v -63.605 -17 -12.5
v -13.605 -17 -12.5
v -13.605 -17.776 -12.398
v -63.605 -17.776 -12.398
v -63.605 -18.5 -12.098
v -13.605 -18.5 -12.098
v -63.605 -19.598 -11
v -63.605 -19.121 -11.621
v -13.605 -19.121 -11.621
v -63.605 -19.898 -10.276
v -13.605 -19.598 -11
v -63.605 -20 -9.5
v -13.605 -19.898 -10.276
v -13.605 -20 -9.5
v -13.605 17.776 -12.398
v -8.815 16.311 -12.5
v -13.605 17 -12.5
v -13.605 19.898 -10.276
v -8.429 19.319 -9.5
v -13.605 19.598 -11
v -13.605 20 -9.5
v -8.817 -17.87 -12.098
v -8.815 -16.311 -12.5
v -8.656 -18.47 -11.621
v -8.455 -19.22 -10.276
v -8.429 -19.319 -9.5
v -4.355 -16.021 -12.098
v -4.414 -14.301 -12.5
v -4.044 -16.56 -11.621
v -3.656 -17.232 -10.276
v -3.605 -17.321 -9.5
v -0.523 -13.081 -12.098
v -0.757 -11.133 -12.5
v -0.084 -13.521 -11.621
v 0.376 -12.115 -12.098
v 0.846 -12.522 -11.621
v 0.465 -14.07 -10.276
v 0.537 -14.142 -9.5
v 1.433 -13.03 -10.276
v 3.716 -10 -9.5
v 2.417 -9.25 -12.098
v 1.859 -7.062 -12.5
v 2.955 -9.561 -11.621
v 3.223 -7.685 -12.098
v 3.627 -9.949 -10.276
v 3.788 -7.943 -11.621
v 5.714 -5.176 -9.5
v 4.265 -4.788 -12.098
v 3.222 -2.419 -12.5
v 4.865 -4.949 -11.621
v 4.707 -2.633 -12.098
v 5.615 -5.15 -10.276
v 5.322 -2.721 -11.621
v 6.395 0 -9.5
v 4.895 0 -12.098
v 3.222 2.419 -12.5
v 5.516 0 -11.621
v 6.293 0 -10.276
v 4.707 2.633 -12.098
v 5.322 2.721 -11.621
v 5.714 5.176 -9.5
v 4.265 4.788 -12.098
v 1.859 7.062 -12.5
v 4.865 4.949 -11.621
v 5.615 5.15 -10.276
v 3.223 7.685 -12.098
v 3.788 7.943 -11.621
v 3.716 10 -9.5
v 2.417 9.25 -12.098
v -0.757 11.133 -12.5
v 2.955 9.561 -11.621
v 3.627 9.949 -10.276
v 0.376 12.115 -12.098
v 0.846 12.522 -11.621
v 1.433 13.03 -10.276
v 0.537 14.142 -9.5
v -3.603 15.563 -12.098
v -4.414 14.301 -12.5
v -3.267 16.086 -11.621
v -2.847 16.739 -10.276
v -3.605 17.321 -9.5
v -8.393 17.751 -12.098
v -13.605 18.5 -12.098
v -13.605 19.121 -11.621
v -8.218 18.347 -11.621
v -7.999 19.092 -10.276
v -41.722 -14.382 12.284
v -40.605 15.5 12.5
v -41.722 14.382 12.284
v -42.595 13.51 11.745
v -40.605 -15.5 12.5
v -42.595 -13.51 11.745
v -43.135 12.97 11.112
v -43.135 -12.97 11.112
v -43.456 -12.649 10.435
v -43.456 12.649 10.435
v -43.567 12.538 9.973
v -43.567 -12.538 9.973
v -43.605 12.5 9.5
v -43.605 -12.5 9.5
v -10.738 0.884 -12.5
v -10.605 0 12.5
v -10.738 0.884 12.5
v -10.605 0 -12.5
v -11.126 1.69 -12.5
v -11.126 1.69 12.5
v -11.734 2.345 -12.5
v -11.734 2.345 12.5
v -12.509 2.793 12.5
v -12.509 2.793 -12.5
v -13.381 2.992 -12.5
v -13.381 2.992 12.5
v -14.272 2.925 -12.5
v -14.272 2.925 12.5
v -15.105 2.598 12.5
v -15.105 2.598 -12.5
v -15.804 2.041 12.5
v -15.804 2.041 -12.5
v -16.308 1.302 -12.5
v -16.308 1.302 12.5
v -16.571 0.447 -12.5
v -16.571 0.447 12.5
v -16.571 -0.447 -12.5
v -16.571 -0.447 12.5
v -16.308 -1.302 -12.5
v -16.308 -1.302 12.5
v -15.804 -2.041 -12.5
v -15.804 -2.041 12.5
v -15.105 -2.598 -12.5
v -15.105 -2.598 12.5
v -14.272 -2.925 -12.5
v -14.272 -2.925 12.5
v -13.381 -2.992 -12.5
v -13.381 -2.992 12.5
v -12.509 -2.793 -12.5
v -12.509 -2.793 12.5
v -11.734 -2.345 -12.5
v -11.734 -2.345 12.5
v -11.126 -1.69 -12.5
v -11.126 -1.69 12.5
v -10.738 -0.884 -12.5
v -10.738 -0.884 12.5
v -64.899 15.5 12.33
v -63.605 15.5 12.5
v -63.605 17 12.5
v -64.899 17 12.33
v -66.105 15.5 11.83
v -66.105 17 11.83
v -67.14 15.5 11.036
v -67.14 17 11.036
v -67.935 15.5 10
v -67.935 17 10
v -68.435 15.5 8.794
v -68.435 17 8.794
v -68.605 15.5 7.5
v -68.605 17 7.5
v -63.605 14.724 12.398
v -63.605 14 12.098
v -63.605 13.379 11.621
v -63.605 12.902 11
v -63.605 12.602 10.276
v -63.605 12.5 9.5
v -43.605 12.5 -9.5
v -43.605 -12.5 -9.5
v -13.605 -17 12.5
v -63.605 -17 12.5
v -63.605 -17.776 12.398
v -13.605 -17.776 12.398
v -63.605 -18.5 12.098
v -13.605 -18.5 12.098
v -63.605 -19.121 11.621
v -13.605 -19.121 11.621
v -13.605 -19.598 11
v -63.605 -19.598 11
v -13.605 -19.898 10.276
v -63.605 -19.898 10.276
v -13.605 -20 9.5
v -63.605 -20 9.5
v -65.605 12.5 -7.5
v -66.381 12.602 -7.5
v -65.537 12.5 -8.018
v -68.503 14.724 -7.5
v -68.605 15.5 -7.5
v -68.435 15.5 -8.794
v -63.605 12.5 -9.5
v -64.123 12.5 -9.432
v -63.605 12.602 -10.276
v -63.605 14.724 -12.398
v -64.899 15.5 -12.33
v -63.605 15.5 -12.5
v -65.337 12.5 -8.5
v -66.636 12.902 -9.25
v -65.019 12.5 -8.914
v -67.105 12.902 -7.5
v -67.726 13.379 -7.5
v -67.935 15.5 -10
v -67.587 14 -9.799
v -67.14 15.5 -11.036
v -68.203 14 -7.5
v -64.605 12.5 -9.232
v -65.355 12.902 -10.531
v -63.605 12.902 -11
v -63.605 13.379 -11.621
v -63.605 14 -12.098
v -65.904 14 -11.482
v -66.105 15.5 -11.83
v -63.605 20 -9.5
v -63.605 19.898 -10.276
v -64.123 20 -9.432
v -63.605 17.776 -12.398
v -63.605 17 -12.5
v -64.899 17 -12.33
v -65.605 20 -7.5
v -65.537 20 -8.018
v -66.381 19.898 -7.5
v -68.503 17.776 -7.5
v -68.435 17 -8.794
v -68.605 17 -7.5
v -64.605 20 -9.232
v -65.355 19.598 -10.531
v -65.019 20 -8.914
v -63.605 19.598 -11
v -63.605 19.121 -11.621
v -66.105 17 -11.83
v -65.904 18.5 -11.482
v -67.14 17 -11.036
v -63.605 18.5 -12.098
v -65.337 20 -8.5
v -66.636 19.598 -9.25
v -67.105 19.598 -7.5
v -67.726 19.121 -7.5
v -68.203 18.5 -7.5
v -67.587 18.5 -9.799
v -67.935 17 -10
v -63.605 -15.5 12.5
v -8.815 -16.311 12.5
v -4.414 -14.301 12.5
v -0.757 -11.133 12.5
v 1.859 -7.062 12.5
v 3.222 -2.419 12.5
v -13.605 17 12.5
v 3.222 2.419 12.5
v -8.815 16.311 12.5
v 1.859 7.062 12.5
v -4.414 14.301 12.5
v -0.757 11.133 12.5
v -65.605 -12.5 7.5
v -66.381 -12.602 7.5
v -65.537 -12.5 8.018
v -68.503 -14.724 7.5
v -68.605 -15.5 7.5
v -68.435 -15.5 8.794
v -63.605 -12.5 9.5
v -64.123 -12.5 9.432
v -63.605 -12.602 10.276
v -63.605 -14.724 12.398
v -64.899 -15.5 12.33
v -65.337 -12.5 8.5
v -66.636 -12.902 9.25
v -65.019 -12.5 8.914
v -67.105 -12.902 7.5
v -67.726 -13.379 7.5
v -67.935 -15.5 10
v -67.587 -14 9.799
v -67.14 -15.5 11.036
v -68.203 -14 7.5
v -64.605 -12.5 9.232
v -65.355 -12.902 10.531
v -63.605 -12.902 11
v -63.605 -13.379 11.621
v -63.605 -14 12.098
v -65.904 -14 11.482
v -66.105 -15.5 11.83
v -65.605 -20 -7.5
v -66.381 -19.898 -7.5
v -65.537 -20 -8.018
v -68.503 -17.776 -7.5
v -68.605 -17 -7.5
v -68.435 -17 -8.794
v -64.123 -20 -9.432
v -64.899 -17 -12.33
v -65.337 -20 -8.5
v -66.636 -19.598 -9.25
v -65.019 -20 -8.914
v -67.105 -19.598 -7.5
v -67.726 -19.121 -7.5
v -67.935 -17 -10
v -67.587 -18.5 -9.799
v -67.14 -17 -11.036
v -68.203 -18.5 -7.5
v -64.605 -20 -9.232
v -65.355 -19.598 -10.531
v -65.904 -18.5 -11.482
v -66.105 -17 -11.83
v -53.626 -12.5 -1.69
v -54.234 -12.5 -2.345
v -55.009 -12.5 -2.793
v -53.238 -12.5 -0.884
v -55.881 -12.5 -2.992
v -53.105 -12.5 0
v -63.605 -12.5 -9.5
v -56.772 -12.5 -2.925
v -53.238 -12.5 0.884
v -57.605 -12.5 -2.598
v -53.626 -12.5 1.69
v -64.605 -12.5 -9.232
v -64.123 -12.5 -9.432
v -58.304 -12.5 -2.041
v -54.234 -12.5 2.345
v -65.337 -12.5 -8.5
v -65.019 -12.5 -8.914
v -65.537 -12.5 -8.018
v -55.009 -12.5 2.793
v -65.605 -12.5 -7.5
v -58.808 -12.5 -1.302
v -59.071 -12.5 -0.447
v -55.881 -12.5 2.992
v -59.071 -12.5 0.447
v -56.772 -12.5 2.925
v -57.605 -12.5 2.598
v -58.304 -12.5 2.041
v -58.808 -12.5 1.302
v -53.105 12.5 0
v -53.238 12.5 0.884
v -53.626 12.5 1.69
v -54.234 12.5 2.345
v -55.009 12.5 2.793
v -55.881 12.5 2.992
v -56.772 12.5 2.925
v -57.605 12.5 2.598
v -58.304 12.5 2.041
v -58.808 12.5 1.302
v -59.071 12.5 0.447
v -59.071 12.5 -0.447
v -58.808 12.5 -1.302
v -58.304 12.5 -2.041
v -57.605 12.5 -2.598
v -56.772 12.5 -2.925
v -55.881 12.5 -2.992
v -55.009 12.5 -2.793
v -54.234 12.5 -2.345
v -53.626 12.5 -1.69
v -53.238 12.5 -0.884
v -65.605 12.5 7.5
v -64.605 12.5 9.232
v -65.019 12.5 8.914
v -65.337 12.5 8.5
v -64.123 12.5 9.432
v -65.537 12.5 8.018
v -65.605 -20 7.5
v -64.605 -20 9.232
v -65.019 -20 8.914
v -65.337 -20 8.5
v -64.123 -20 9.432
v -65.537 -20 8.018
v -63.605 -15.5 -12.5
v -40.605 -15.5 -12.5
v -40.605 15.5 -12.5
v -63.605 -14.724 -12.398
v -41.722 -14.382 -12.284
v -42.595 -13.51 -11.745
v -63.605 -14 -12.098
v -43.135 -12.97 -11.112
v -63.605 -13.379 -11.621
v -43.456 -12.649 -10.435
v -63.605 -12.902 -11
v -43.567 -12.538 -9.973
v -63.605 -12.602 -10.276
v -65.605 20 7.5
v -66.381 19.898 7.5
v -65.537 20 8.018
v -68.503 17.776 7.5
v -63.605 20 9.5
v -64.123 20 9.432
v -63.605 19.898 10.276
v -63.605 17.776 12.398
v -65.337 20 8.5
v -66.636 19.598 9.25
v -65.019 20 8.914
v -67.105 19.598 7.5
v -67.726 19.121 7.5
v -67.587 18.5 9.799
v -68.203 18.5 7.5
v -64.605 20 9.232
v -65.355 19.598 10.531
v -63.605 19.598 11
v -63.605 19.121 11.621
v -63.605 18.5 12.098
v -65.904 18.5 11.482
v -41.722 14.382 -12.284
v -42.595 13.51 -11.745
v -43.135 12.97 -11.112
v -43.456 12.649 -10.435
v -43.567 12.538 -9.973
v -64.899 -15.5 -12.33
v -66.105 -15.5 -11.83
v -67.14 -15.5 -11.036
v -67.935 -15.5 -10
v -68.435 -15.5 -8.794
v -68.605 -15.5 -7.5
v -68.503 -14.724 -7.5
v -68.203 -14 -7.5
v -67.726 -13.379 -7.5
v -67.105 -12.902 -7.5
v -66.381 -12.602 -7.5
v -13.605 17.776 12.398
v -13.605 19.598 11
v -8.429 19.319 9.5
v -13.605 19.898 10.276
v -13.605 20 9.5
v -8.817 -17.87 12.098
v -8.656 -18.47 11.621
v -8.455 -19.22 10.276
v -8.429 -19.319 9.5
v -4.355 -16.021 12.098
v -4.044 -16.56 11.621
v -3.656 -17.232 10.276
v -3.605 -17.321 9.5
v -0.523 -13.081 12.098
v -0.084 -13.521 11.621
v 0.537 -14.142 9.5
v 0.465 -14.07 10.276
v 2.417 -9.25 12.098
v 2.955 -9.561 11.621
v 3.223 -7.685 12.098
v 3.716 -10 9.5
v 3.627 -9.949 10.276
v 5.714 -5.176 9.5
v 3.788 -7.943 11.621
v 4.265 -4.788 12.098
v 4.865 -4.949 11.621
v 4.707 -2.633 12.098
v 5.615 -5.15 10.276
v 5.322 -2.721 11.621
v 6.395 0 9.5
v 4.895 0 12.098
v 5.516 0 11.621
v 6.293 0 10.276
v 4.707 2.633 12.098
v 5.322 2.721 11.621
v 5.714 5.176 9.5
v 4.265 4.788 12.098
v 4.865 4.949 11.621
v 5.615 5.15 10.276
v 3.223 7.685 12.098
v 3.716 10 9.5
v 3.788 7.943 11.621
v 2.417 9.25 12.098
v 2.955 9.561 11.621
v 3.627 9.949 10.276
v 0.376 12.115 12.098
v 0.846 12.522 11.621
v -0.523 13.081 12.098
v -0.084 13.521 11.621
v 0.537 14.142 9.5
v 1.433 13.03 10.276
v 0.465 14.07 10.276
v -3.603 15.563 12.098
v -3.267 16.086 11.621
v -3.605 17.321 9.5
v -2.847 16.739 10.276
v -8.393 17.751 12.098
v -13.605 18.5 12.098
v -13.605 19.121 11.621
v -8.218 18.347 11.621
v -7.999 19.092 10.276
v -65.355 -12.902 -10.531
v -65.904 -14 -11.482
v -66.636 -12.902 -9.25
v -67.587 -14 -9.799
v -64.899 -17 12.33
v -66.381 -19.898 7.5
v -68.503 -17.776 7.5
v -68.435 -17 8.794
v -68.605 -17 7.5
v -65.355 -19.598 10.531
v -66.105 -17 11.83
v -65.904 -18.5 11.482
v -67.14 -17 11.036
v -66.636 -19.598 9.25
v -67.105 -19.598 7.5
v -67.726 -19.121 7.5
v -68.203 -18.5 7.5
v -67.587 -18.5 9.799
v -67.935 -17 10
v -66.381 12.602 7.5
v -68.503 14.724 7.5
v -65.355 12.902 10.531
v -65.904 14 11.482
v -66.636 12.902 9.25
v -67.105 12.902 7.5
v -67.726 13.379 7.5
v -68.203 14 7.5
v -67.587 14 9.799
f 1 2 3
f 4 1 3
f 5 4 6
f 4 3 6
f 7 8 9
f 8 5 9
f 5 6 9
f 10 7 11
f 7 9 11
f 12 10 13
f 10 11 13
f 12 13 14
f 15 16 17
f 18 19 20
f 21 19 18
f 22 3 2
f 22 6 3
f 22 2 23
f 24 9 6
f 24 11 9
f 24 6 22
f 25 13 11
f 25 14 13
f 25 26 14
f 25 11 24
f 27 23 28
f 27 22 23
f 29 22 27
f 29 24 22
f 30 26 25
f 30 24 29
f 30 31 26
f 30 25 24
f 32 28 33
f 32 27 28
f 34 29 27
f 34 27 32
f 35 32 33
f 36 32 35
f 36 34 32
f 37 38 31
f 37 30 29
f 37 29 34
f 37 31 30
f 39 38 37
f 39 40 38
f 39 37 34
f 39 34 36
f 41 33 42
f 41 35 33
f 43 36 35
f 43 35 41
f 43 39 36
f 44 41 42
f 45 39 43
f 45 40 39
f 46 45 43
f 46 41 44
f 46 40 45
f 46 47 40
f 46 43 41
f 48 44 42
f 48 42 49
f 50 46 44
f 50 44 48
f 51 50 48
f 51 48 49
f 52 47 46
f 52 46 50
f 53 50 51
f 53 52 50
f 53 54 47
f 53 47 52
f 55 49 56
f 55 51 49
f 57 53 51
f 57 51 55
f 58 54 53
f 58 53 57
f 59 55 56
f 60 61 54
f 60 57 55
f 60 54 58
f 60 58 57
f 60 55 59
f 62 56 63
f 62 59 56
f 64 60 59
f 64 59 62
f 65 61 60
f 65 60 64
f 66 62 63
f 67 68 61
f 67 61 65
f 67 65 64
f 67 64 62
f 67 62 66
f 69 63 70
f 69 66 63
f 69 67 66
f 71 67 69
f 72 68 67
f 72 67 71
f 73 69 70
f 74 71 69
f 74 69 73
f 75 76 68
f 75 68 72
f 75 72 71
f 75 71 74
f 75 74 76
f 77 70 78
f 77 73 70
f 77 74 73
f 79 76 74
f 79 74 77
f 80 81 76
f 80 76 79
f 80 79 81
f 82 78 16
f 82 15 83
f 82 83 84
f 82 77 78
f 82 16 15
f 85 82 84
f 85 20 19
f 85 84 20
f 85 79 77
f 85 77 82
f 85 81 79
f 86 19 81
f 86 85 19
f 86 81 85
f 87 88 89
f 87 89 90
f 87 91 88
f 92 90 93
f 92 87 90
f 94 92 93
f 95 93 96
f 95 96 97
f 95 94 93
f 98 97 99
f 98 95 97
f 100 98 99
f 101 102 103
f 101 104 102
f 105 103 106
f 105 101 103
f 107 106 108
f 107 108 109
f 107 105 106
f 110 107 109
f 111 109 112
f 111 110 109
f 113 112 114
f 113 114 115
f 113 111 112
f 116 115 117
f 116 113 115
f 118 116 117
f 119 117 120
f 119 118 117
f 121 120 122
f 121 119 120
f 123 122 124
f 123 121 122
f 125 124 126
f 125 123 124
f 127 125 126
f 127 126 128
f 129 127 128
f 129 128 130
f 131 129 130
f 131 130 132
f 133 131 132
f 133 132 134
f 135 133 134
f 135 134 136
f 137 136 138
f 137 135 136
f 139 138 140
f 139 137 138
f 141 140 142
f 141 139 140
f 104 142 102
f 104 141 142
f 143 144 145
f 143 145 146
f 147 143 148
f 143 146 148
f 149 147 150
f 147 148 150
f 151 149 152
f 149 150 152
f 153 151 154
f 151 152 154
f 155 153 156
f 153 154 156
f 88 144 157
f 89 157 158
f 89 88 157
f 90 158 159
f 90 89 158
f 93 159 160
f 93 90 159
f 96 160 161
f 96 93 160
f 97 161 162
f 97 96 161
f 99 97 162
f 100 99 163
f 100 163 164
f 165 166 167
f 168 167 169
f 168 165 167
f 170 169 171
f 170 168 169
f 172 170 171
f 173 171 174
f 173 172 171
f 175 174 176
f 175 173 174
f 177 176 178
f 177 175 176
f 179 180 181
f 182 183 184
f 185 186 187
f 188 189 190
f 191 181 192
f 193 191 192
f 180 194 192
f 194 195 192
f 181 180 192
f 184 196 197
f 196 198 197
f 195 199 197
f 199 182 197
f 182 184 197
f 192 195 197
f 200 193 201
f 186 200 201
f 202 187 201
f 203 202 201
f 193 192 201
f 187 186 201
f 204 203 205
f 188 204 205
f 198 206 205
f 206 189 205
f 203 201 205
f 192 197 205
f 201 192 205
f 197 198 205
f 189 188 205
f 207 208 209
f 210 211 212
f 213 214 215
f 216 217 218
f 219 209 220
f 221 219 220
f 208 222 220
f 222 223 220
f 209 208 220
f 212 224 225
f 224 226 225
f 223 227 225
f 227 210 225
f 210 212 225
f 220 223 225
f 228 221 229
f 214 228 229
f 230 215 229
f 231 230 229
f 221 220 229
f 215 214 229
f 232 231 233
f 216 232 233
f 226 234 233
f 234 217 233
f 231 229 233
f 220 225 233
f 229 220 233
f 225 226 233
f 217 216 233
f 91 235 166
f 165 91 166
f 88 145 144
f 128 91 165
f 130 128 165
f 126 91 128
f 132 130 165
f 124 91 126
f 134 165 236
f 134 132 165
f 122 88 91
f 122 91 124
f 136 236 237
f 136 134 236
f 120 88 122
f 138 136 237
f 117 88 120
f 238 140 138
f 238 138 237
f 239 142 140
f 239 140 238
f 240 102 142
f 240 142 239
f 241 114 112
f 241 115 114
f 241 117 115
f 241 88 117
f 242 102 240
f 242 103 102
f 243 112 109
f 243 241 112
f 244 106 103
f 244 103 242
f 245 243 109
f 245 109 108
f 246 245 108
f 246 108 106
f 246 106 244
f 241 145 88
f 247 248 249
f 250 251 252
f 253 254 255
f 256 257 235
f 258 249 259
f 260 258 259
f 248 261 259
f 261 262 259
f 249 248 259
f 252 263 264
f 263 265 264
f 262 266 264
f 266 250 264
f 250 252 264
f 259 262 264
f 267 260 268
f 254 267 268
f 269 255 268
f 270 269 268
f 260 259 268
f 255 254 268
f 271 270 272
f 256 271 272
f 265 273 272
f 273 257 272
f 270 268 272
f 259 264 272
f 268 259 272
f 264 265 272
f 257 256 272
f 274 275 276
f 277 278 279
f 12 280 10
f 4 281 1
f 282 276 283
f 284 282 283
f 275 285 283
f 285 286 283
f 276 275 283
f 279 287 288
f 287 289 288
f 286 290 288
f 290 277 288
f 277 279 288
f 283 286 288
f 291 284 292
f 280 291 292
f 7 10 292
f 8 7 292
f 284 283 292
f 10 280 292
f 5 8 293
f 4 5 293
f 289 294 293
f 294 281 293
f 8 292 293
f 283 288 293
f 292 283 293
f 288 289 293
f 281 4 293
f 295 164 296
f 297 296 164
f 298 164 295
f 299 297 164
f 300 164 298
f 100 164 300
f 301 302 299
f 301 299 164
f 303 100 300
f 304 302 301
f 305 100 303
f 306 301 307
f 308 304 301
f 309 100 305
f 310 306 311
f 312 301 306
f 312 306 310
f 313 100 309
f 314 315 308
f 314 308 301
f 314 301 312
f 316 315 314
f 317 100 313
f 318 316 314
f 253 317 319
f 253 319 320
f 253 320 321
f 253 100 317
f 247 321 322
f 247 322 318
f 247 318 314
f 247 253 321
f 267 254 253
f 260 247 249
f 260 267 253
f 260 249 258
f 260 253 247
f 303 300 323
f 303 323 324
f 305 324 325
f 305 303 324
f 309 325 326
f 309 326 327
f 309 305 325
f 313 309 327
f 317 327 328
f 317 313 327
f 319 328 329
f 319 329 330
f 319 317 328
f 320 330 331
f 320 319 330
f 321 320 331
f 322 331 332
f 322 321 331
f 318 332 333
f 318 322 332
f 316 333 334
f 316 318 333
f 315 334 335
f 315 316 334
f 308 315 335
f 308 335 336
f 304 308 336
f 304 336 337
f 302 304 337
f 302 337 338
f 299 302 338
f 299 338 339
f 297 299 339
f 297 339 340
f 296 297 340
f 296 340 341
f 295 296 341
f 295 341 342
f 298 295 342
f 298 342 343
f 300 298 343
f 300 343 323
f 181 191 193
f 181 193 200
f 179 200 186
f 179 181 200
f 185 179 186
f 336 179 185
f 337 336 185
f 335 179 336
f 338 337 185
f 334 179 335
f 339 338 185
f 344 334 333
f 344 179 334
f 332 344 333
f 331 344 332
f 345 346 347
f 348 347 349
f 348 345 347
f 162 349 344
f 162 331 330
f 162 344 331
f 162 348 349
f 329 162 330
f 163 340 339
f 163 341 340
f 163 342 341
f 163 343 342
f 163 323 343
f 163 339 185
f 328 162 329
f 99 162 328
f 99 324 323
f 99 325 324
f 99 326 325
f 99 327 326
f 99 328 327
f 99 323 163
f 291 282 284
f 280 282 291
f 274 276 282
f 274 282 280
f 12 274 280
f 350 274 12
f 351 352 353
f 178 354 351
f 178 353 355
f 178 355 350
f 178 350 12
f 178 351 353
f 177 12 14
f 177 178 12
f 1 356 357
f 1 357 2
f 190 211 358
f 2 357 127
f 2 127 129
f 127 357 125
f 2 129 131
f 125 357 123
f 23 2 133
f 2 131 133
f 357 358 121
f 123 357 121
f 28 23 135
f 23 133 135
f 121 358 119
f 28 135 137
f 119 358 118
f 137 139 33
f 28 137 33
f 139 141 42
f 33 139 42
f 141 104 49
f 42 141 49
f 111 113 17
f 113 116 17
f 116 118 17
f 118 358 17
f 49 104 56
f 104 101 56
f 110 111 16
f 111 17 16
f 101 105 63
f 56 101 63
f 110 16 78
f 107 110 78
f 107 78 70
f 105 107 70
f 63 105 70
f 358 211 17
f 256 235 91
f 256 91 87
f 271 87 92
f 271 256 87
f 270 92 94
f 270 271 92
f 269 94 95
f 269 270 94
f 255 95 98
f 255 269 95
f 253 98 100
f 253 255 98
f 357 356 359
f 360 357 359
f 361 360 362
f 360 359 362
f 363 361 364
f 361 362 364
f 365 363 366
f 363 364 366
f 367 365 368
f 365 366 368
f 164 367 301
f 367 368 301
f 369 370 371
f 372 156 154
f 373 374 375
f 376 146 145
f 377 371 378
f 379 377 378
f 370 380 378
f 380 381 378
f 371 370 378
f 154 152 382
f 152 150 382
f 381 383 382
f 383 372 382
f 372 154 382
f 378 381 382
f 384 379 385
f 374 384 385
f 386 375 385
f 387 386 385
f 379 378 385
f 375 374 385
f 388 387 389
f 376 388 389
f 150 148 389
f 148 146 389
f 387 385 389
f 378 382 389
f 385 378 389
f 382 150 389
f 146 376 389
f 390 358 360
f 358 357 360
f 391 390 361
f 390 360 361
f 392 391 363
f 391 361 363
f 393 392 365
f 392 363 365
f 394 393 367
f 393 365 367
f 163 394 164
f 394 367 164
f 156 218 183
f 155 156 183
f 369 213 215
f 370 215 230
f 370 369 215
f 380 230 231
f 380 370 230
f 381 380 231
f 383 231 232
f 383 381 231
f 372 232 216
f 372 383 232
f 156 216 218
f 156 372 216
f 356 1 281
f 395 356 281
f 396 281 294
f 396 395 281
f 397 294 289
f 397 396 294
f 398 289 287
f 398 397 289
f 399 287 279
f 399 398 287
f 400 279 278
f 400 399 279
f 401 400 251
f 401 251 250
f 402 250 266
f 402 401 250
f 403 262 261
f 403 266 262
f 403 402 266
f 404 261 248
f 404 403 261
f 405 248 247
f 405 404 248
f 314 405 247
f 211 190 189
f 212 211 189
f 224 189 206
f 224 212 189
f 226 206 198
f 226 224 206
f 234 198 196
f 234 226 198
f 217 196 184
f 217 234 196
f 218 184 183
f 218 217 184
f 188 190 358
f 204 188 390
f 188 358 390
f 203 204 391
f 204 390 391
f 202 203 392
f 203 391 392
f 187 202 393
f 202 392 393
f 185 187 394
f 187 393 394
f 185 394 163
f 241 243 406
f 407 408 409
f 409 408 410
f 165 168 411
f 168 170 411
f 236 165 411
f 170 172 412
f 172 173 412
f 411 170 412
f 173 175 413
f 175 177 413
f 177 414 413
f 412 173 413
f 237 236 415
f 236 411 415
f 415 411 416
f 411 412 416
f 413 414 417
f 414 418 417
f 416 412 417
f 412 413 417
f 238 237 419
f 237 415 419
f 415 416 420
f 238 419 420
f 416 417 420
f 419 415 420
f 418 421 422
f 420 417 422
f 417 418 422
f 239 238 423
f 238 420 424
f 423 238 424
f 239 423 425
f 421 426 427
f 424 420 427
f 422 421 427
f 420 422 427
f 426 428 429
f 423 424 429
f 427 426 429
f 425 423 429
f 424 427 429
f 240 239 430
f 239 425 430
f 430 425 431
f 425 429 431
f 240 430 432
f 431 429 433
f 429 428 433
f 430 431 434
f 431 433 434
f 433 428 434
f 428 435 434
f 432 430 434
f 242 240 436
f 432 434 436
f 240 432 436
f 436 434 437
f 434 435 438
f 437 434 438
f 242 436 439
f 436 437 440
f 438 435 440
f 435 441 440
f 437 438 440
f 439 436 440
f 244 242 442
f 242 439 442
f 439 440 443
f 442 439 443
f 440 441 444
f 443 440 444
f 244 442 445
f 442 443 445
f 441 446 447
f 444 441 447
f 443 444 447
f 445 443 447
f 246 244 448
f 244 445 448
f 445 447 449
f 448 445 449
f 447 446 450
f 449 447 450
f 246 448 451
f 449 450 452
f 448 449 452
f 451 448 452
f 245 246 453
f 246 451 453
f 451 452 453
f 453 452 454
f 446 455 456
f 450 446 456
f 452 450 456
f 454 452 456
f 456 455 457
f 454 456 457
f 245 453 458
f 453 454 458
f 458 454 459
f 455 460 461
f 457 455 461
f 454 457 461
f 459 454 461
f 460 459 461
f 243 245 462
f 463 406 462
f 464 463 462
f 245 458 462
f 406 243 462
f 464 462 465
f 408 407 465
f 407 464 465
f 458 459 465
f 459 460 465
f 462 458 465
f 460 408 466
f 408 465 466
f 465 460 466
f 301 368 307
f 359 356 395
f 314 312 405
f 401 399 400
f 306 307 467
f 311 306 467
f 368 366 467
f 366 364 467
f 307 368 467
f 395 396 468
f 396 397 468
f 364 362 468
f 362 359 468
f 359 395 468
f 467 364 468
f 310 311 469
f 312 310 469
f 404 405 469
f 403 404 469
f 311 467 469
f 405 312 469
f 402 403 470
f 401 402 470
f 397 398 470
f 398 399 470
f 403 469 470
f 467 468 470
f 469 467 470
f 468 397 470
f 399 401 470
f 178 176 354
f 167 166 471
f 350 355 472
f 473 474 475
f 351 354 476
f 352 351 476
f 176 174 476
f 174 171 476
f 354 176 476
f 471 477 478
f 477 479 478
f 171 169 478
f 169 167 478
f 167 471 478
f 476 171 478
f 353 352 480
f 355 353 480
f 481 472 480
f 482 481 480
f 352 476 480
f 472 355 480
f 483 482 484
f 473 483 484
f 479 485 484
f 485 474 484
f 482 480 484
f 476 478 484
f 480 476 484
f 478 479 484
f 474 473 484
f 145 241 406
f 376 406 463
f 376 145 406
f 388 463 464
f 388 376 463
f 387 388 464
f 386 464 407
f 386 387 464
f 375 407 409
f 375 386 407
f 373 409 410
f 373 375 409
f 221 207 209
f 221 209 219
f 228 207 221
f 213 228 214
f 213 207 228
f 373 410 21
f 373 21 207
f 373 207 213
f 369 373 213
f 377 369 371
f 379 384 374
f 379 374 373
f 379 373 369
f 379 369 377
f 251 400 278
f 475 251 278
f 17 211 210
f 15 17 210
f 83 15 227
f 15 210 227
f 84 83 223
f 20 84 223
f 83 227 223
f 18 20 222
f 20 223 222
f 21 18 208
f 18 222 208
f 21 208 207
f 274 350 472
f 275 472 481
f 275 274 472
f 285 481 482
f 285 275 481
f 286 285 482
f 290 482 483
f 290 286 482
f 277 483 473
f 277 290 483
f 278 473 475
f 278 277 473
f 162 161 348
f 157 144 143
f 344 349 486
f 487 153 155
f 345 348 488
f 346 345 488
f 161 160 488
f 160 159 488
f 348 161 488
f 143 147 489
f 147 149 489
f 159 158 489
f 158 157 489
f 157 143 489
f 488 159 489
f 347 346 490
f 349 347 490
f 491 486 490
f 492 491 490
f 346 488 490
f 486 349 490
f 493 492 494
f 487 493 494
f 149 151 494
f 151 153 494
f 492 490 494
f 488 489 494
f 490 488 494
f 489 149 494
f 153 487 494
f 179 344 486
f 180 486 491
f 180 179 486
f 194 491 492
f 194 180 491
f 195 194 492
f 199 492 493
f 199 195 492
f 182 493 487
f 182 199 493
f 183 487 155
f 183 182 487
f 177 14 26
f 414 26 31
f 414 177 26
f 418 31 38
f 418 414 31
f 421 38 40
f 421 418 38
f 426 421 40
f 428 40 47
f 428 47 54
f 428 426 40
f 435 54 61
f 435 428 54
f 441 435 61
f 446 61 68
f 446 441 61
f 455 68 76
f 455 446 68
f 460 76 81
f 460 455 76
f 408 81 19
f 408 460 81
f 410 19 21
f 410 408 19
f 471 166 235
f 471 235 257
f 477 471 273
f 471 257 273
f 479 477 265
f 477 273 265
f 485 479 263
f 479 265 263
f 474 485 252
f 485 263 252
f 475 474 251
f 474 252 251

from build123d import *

# Parameters (mm, degrees)
F0_R         = 3
F1_DEPTH     = 12.5
F2_R         = 3
F3_DEPTH     = 40
F4_R         = 3
F5_T1_DEPTH  = 7.5
F5_T3_DEPTH  = 7.5
F5_T6_ANGLE  = 90
F5_T8_ANGLE  = 90
F5_T10_ANGLE = 90
F5_T12_ANGLE = 90
F5_T14_ANGLE = 90
F5_T16_ANGLE = 90
F5_T18_ANGLE = 90
F5_T20_ANGLE = 90


# Not quite as in the source:
# - a fillet or chamfer that OpenCascade refuses, or shapes differently, is made with other operations: its cross-section is extruded or revolved along the edge and cut away or added


with BuildPart() as f1:
    # F0 (on Top) → F1 (new body, symmetric)
    with BuildSketch(Plane.XY):
        with BuildLine():
            Line((-68.6048818245, -20), (-13.6048818245, -20))
            ThreePointArc((-13.6048818245, -20), (-33.6048818245, 0), (-13.6048818245, 20))
            Line((-13.6048818245, 20), (-68.6048818245, 20))
            Line((-68.6048818245, 20), (-68.6048818245, 12.5))
            Line((-68.6048818245, 12.5), (-43.6048818245, 12.5))
            Line((-43.6048818245, 12.5), (-43.6048818245, -12.5))
            Line((-43.6048818245, -12.5), (-68.6048818245, -12.5))
            Line((-68.6048818245, -12.5), (-68.6048818245, -20))
        make_face()
        with BuildLine():
            ThreePointArc((-13.6048818245, 20), (-33.6048818245, 0), (-13.6048818245, -20))
            ThreePointArc((-13.6048818245, -20), (0.5372537993, -14.1421356237), (6.3951181755, 0))
            ThreePointArc((6.3951181755, 0), (0.5372537993, 14.1421356237), (-13.6048818245, 20))
        make_face()
        with Locations((-13.6048818245, 0)):
            Circle(F0_R, mode=Mode.SUBTRACT)
    extrude(amount=F1_DEPTH, both=True)

    # F2 (on face) → F3 (join, through all)
    with BuildSketch(Plane.XZ.offset(20)):
        with Locations((-56.1048818245, 0)):
            Circle(F2_R)
    extrude(amount=-F3_DEPTH)

    # F4
    f4_edges = [f1.edges().sort_by_distance(p)[0] for p in [
        (-41.104882, 20, 12.5),
        (-43.604882, 0, 12.5),
        (-56.104882, 12.5, 12.5),
        (-56.104882, -12.5, 12.5),
        (6.395118, 0, -12.5),
        (-43.604882, 0, -12.5),
        (-68.604882, -12.5, 0),
        (-68.604882, 12.5, 0),
        (-56.104882, 12.5, -12.5),
        (-56.104882, -12.5, -12.5),
        (-68.604882, -20, 0),
        (-68.604882, 20, 0),
        (-41.104882, -20, -12.5),
        (-41.104882, -20, 12.5),
        (-41.104882, 20, -12.5),
        (6.395118, 0, 12.5),
    ]]
    fillet(f4_edges, radius=F4_R)

    # F5: fillet of radius 5 on 4 edges, made by hand

    # F5_s2 → F5_t1 (cut)
    with BuildSketch(Plane.XZ.offset(-20)):
        with BuildLine():
            ThreePointArc((-63.6048818245, 12.5), (-67.1404157304, 11.0355339059), (-68.6048818245, 7.5))
            Line((-68.6048818245, 7.5), (-68.6048818245, 12.5))
            Line((-68.6048818245, 12.5), (-63.6048818245, 12.5))
        make_face()
        with BuildLine():
            ThreePointArc((-63.6048818245, -12.5), (-67.1404157304, -11.0355339059), (-68.6048818245, -7.5))
            Line((-68.6048818245, -7.5), (-68.6048818245, -12.5))
            Line((-68.6048818245, -12.5), (-63.6048818245, -12.5))
        make_face()
    extrude(amount=F5_T1_DEPTH, mode=Mode.SUBTRACT)

    # F5_s4 → F5_t3 (cut)
    with BuildSketch(Plane.XZ.offset(12.5)):
        with BuildLine():
            ThreePointArc((-63.6048818245, -12.5), (-67.1404157304, -11.0355339059), (-68.6048818245, -7.5))
            Line((-68.6048818245, -7.5), (-68.6048818245, -12.5))
            Line((-68.6048818245, -12.5), (-63.6048818245, -12.5))
        make_face()
        with BuildLine():
            ThreePointArc((-63.6048818245, 12.5), (-67.1404157304, 11.0355339059), (-68.6048818245, 7.5))
            Line((-68.6048818245, 7.5), (-68.6048818245, 12.5))
            Line((-68.6048818245, 12.5), (-63.6048818245, 12.5))
        make_face()
    extrude(amount=F5_T3_DEPTH, mode=Mode.SUBTRACT)

    # F5_s5 → F5_t6 (revolve, cut)
    with BuildSketch(Plane.XY.offset(7.5)):
        with BuildLine():
            ThreePointArc((-65.6048818245, -12.5), (-67.726202168, -13.3786796564), (-68.6048818245, -15.5))
            Line((-68.6048818245, -15.5), (-68.6048818245, -12.5))
            Line((-68.6048818245, -12.5), (-65.6048818245, -12.5))
        make_face()
    revolve(axis=Axis((-63.6048818245, -12.5, 7.5), (0, 1, 0)), revolution_arc=F5_T6_ANGLE, mode=Mode.SUBTRACT)

    # F5_s7 → F5_t8 (revolve, cut)
    with BuildSketch(Plane.YZ.offset(-63.6048818245)):
        with BuildLine():
            ThreePointArc((-20, 9.5), (-19.1213203436, 11.6213203436), (-17, 12.5))
            Line((-17, 12.5), (-20, 12.5))
            Line((-20, 12.5), (-20, 9.5))
        make_face()
    revolve(axis=Axis((-63.6048818245, -20, 7.5), (0, -1, 0)), revolution_arc=F5_T8_ANGLE, mode=Mode.SUBTRACT)

    # F5_s9 → F5_t10 (revolve, cut)
    with BuildSketch(Plane.YZ.offset(-63.6048818245)):
        with BuildLine():
            ThreePointArc((-12.5, -9.5), (-13.3786796564, -11.6213203436), (-15.5, -12.5))
            Line((-15.5, -12.5), (-12.5, -12.5))
            Line((-12.5, -12.5), (-12.5, -9.5))
        make_face()
    revolve(axis=Axis((-63.6048818245, -12.5, -7.5), (0, 1, 0)), revolution_arc=F5_T10_ANGLE, mode=Mode.SUBTRACT)

    # F5_s11 → F5_t12 (revolve, cut)
    with BuildSketch(Plane.XY.offset(-7.5)):
        with BuildLine():
            ThreePointArc((-65.6048818245, -20), (-67.726202168, -19.1213203436), (-68.6048818245, -17))
            Line((-68.6048818245, -17), (-68.6048818245, -20))
            Line((-68.6048818245, -20), (-65.6048818245, -20))
        make_face()
    revolve(axis=Axis((-63.6048818245, -20, -7.5), (0, -1, 0)), revolution_arc=F5_T12_ANGLE, mode=Mode.SUBTRACT)

    # F5_s13 → F5_t14 (revolve, cut)
    with BuildSketch(Plane.YZ.offset(-63.6048818245)):
        with BuildLine():
            ThreePointArc((20, -9.5), (19.1213203436, -11.6213203436), (17, -12.5))
            Line((17, -12.5), (20, -12.5))
            Line((20, -12.5), (20, -9.5))
        make_face()
    revolve(axis=Axis((-63.6048818245, 20, -7.5), (0, 1, 0)), revolution_arc=F5_T14_ANGLE, mode=Mode.SUBTRACT)

    # F5_s15 → F5_t16 (revolve, cut)
    with BuildSketch(Plane.XY.offset(-7.5)):
        with BuildLine():
            ThreePointArc((-65.6048818245, 12.5), (-67.726202168, 13.3786796564), (-68.6048818245, 15.5))
            Line((-68.6048818245, 15.5), (-68.6048818245, 12.5))
            Line((-68.6048818245, 12.5), (-65.6048818245, 12.5))
        make_face()
    revolve(axis=Axis((-63.6048818245, 12.5, -7.5), (0, -1, 0)), revolution_arc=F5_T16_ANGLE, mode=Mode.SUBTRACT)

    # F5_s17 → F5_t18 (revolve, cut)
    with BuildSketch(Plane.XY.offset(7.5)):
        with BuildLine():
            ThreePointArc((-65.6048818245, 20), (-67.726202168, 19.1213203436), (-68.6048818245, 17))
            Line((-68.6048818245, 17), (-68.6048818245, 20))
            Line((-68.6048818245, 20), (-65.6048818245, 20))
        make_face()
    revolve(axis=Axis((-63.6048818245, 20, 7.5), (0, 1, 0)), revolution_arc=F5_T18_ANGLE, mode=Mode.SUBTRACT)

    # F5_s19 → F5_t20 (revolve, cut)
    with BuildSketch(Plane.YZ.offset(-63.6048818245)):
        with BuildLine():
            ThreePointArc((12.5, 9.5), (13.3786796564, 11.6213203436), (15.5, 12.5))
            Line((15.5, 12.5), (12.5, 12.5))
            Line((12.5, 12.5), (12.5, 9.5))
        make_face()
    revolve(axis=Axis((-63.6048818245, 12.5, 7.5), (0, -1, 0)), revolution_arc=F5_T20_ANGLE, mode=Mode.SUBTRACT)


solid = f1.part
